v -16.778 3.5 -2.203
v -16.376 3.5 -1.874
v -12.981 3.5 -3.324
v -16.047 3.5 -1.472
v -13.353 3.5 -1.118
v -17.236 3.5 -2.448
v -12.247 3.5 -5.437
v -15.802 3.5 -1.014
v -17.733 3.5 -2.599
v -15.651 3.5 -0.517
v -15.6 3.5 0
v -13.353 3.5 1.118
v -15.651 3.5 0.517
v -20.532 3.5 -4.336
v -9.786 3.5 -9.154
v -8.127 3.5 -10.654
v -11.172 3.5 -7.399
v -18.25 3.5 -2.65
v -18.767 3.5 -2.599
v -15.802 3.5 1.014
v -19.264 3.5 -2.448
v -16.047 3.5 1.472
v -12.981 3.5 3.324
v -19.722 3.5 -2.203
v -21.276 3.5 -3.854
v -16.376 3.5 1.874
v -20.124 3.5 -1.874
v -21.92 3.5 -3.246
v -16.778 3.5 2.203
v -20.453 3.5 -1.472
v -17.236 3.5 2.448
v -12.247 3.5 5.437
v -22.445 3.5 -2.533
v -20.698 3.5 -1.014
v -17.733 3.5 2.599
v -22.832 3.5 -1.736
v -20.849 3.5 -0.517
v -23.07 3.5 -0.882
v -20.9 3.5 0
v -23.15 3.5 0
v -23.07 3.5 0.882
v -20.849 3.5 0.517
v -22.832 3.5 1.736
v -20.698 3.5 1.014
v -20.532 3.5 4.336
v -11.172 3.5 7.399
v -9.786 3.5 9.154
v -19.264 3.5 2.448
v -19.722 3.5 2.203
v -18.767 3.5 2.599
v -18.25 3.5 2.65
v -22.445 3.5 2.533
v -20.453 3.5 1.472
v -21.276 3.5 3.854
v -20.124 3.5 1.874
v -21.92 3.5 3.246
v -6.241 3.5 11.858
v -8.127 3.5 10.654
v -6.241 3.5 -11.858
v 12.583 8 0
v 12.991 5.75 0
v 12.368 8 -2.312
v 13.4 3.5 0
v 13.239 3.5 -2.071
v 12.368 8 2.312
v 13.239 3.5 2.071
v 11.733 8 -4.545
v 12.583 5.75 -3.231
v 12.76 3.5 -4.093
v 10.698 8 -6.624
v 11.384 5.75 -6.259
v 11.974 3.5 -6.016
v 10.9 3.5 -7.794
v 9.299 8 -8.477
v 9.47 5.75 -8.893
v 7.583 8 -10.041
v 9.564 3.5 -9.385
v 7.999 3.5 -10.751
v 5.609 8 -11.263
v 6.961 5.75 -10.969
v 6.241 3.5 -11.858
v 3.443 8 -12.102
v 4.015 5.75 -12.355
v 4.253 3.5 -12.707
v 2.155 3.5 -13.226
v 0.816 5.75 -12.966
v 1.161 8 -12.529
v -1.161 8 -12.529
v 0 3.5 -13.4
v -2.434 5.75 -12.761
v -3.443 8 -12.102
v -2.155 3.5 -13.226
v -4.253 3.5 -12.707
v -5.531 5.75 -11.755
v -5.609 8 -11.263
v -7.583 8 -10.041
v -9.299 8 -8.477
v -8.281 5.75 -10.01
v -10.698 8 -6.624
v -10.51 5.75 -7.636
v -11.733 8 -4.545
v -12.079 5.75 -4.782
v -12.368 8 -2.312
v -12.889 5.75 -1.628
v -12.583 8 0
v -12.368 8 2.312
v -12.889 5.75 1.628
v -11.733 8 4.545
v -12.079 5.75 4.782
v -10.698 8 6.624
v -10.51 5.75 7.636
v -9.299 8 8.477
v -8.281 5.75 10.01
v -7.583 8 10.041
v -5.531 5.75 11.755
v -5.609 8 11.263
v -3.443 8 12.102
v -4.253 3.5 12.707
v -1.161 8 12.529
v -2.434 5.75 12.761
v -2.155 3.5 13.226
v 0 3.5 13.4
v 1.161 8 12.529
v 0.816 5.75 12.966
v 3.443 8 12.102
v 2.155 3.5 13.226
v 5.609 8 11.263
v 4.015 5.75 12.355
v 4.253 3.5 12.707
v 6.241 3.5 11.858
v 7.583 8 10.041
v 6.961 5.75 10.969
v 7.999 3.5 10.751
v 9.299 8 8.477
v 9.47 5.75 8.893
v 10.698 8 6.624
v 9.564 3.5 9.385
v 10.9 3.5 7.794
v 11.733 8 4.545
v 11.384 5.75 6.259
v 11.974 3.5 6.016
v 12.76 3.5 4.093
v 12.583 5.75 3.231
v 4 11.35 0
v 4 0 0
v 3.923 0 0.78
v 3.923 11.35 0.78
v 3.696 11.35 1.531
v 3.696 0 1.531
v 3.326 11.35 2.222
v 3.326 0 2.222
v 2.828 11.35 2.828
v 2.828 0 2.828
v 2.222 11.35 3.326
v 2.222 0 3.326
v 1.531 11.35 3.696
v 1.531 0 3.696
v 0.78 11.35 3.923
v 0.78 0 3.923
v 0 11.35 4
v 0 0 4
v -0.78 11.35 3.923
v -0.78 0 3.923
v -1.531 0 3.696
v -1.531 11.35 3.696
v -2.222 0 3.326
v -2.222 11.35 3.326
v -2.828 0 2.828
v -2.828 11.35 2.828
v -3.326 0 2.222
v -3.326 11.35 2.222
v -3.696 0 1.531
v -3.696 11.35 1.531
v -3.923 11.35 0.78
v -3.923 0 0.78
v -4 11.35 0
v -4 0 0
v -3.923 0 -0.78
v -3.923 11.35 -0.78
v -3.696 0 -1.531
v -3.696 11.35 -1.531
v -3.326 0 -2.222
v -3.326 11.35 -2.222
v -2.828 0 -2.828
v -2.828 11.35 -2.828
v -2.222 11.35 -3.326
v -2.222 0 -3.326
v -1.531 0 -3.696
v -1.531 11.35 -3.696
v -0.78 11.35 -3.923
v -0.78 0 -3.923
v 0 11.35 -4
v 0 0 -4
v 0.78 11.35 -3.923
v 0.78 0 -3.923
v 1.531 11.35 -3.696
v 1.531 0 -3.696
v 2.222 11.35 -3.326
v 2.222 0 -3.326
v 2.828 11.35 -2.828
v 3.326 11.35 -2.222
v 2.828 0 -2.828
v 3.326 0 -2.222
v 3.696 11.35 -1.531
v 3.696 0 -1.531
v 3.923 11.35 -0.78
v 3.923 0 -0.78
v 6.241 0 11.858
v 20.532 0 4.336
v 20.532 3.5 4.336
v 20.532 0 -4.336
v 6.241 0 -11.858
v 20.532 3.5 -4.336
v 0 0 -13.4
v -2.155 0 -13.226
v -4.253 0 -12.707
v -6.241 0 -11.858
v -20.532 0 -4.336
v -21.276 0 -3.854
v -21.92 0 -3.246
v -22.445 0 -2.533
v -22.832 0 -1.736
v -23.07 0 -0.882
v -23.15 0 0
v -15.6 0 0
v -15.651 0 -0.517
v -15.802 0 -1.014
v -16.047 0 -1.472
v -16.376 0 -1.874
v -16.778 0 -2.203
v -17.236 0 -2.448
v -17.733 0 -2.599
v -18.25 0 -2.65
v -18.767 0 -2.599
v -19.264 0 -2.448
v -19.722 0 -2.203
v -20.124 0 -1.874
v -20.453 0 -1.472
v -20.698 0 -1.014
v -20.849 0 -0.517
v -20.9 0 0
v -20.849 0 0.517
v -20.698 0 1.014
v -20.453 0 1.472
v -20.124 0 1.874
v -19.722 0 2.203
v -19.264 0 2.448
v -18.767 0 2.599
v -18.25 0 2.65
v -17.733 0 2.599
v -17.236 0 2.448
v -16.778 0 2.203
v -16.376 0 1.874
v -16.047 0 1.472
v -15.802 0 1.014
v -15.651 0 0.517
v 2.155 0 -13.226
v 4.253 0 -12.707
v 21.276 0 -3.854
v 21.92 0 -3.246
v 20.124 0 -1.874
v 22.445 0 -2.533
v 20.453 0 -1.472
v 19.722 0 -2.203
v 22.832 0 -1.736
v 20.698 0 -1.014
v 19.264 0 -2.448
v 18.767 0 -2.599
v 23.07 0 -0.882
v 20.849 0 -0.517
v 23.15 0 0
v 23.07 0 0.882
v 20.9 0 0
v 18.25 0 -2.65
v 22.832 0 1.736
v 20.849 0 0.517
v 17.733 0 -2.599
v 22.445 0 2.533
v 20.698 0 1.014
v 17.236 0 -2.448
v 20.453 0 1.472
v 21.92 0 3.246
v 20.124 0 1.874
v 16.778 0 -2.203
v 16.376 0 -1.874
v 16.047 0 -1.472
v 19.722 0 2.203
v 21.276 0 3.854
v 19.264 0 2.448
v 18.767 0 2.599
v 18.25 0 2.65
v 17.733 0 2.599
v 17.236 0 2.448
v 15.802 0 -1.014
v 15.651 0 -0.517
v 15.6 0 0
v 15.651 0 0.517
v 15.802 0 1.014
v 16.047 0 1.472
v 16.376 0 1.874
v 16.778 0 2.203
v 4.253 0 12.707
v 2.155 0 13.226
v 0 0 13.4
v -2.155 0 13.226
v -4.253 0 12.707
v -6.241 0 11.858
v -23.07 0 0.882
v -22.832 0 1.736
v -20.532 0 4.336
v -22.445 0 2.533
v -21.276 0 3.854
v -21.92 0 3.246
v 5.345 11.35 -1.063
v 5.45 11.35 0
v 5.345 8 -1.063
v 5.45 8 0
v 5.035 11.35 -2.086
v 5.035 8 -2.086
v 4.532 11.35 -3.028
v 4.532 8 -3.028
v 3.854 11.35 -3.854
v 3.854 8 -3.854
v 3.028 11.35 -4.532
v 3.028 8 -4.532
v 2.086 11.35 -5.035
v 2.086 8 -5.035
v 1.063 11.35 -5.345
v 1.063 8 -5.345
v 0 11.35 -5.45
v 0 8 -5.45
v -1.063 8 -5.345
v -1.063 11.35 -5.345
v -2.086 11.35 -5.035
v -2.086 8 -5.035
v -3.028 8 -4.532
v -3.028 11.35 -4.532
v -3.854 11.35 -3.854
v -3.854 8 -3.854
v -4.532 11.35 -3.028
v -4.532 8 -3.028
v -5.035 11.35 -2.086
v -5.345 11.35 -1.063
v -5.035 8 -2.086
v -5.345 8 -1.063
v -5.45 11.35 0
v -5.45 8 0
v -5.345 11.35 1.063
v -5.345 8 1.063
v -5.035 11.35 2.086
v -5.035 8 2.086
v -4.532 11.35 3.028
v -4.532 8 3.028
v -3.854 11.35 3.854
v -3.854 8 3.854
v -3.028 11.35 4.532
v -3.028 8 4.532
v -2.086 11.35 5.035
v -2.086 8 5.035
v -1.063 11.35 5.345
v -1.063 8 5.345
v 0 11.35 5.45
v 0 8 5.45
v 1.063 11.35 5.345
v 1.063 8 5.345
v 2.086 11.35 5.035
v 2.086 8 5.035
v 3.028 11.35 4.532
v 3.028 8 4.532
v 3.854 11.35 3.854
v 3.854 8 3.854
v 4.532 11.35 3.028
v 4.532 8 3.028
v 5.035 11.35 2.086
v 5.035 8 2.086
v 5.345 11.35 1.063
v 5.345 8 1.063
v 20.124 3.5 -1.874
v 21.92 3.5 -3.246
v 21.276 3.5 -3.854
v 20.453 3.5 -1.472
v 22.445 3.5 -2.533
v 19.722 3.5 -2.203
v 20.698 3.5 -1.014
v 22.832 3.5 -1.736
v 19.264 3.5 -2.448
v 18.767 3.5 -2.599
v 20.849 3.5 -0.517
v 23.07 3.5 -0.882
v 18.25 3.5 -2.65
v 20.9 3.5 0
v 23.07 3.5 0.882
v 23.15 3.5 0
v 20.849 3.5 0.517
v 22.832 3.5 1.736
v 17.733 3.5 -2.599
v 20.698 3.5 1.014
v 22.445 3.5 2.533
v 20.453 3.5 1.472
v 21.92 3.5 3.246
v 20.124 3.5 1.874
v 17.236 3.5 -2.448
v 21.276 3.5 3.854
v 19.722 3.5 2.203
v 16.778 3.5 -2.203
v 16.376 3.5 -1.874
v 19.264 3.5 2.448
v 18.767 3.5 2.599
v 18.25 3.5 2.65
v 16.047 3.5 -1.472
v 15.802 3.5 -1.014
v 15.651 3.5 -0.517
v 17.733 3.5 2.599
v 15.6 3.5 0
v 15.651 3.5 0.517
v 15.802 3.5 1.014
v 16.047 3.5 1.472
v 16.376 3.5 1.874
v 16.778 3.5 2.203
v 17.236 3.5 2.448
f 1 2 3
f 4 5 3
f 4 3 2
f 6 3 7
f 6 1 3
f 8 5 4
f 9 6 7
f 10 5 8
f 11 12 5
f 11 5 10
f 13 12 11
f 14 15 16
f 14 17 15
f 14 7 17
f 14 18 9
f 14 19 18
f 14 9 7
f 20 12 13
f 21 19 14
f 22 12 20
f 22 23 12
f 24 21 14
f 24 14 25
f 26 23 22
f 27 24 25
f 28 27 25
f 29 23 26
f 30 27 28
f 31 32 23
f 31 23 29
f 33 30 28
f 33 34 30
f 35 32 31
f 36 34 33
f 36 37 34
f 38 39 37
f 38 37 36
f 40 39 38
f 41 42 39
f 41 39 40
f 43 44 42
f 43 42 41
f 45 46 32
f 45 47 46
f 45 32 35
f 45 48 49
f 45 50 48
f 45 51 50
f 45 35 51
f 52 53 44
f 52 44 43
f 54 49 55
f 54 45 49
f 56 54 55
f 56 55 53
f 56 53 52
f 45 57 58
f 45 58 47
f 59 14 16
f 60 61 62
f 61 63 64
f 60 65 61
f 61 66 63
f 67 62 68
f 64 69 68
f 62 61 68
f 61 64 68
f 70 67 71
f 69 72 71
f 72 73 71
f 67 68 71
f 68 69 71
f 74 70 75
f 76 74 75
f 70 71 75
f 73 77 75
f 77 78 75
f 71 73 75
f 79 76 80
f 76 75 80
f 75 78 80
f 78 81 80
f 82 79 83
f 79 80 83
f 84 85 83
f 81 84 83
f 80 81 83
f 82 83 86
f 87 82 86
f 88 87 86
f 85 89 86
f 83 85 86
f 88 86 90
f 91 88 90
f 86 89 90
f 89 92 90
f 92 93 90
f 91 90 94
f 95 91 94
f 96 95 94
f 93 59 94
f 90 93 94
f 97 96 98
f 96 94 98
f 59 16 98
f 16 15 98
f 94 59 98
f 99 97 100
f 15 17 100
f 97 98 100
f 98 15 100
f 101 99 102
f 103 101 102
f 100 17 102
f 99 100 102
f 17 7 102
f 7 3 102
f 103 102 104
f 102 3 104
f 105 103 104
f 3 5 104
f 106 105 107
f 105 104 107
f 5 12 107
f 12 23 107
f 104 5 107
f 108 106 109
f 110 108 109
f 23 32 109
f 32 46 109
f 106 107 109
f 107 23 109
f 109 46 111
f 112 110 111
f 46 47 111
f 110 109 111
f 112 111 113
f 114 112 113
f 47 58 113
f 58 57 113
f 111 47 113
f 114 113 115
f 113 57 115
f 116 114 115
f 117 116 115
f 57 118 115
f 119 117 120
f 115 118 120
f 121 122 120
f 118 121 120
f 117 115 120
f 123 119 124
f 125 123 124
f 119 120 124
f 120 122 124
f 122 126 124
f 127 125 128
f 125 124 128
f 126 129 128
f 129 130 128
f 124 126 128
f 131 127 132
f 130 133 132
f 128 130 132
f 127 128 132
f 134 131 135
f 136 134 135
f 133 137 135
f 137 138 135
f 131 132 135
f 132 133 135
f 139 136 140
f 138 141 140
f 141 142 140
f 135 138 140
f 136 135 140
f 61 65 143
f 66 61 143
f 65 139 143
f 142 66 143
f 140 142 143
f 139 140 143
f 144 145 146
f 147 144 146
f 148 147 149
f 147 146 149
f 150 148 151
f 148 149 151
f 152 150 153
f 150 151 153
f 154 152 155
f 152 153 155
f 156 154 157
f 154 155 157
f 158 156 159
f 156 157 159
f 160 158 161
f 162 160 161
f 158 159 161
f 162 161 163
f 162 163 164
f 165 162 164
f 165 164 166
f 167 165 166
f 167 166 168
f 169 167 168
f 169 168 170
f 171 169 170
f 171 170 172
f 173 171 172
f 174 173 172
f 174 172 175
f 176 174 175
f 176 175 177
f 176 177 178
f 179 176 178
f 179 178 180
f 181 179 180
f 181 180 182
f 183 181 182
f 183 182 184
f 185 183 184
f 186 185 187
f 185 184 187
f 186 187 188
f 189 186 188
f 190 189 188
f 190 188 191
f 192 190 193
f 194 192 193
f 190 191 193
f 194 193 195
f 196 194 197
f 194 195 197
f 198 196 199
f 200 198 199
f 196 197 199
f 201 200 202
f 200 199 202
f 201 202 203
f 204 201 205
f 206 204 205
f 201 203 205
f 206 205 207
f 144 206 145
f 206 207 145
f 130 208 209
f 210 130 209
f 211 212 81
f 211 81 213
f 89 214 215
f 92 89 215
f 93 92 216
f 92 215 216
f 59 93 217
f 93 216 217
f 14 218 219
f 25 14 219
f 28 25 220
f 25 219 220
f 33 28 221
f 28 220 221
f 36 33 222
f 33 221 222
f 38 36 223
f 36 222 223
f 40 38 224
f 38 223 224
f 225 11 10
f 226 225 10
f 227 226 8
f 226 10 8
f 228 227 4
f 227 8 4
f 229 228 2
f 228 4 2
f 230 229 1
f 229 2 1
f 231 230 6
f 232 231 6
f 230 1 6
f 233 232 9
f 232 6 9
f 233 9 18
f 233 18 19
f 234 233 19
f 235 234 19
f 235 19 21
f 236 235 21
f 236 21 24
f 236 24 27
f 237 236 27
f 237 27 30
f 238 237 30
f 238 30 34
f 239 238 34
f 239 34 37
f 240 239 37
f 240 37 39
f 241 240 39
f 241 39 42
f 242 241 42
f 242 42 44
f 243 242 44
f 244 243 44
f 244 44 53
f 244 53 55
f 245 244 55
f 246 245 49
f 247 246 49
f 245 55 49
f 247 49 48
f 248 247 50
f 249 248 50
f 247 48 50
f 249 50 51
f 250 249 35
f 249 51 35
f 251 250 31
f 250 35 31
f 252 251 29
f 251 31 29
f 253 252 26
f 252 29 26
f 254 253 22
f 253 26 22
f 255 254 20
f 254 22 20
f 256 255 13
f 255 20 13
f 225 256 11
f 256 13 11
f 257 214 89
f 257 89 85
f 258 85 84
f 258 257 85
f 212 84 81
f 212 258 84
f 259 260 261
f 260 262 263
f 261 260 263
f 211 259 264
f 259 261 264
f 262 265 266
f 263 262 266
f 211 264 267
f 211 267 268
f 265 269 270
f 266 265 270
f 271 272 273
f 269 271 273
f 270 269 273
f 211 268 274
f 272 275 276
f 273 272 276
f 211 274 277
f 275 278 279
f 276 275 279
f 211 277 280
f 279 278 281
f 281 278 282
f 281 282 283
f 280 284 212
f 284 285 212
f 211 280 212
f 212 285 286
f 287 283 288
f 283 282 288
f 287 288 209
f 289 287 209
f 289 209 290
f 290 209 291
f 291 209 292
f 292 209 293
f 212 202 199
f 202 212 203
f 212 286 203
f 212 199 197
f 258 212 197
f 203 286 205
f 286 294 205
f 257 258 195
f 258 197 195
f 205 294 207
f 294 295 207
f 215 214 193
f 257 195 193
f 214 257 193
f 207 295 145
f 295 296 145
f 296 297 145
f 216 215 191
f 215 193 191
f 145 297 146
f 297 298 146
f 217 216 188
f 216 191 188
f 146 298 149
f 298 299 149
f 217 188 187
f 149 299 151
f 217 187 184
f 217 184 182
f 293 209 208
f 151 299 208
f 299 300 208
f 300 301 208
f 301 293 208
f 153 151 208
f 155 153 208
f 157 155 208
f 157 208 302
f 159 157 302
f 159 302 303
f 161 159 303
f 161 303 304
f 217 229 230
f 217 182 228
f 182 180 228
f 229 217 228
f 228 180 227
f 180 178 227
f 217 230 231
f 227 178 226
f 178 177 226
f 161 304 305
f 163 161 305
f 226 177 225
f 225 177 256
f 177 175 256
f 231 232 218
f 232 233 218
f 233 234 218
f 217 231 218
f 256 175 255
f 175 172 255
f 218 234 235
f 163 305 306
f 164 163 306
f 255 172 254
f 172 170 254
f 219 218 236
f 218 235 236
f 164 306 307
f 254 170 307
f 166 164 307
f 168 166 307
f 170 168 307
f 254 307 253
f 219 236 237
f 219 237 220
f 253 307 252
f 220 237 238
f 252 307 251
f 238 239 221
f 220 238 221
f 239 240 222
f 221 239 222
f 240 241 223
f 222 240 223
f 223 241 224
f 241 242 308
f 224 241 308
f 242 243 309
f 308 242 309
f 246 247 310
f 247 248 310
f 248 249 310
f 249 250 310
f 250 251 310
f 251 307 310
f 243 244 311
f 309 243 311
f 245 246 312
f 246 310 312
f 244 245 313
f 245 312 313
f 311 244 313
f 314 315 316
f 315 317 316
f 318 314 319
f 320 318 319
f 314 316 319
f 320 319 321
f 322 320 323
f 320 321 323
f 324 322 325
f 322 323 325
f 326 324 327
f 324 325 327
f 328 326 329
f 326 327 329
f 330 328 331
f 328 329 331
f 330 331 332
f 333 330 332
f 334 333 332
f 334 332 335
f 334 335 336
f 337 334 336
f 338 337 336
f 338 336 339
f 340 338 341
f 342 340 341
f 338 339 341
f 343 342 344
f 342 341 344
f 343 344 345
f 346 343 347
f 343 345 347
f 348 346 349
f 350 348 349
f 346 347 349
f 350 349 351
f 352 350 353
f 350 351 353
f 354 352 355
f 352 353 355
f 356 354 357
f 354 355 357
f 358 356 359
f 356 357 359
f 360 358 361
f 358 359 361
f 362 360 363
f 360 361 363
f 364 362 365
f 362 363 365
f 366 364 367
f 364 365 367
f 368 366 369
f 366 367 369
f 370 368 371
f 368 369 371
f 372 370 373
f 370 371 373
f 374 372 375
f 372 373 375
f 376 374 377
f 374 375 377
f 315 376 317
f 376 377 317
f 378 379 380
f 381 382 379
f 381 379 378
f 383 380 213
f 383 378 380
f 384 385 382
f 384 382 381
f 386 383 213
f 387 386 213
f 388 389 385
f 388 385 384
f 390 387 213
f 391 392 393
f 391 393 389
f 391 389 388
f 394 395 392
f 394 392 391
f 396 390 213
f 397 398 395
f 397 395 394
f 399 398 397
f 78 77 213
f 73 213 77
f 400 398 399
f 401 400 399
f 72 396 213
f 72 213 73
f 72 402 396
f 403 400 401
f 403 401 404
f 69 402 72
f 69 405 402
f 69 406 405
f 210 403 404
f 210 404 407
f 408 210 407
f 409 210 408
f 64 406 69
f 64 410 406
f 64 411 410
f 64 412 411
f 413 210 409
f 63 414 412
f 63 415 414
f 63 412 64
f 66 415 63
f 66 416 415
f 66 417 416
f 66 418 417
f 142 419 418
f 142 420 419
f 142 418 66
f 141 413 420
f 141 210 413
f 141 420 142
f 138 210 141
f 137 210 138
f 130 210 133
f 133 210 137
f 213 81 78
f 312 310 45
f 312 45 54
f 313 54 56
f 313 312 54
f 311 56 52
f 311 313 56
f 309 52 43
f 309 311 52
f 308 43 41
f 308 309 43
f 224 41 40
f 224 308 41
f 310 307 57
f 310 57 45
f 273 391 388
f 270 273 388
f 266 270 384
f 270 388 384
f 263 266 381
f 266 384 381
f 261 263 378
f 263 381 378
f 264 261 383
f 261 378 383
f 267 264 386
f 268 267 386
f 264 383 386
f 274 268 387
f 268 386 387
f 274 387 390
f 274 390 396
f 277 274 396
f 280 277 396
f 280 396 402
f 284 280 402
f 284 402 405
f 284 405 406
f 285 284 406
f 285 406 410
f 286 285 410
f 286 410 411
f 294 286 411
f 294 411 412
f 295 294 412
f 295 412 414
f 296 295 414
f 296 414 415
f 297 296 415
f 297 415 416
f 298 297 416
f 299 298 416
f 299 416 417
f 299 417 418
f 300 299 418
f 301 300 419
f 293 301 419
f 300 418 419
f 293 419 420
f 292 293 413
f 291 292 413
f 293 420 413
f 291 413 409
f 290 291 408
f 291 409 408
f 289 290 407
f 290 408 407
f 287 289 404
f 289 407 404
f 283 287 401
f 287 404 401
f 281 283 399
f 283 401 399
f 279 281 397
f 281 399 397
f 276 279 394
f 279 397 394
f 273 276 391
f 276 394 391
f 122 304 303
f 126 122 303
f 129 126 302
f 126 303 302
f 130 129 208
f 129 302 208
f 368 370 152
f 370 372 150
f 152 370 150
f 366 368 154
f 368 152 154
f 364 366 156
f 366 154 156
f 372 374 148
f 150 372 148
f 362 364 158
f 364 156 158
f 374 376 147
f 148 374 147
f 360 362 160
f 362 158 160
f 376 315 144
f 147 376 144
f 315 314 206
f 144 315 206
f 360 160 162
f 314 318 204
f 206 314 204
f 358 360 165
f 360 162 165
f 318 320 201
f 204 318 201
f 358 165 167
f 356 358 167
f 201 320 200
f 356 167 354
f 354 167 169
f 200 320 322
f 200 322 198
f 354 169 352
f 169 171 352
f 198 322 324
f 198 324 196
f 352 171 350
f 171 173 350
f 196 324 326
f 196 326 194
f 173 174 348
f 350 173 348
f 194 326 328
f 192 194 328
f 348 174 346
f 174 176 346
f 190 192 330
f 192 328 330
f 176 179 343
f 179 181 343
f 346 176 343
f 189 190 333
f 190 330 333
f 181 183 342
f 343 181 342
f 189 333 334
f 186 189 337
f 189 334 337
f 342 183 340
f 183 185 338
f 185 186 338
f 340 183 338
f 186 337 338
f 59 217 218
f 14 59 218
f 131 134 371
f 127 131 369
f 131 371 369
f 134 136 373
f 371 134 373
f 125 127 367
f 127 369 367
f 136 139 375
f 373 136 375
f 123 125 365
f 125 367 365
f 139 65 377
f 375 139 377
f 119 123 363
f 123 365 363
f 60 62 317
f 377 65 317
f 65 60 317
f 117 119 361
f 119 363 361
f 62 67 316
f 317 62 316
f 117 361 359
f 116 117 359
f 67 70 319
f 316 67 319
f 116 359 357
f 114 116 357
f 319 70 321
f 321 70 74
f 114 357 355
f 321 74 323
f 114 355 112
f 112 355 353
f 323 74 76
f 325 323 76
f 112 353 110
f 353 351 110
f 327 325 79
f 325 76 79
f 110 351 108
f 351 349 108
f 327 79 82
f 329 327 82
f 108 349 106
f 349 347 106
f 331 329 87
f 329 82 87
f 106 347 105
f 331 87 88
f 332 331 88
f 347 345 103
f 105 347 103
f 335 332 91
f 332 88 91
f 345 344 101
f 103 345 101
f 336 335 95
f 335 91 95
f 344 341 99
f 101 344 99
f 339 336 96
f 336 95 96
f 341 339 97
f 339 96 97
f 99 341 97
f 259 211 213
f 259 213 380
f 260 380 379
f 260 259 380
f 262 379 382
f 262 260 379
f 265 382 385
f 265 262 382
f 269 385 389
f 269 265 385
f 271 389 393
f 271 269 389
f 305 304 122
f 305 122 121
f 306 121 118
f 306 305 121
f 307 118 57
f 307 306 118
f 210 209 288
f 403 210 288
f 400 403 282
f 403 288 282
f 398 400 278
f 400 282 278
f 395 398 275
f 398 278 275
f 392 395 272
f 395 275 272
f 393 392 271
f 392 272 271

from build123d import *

# Parameters (mm, degrees)
BOSS_EXTRUDE1_DEPTH  = 3.5
SKETCH3_R            = 4
CUT_EXTRUDE1_DEPTH   = 12.35
M5_CLEARANCE_HOLE1_D = 5.3


with BuildPart() as part:
    # Sketch1 → Boss-Extrude1 (new body)
    with BuildSketch(Plane(origin=(0, 0, 0), x_dir=(1, 0, 0), z_dir=(0, 1, 0))):
        with BuildLine():
            Line((-23.15, 0), (0, 0))
            Line((0, 0), (0, 13.4))
            ThreePointArc((0, 13.4), (-3.214400781, 13.008751962), (-6.24109589, 11.857854869))
            Line((-6.24109589, 11.857854869), (-20.532191781, 4.336081258))
            ThreePointArc((-20.532191781, 4.336081258), (-22.44480272, 2.532514588), (-23.15, 0))
        make_face()
    extrude(amount=BOSS_EXTRUDE1_DEPTH)

    # Mirror3: part across plane


with BuildPart() as part_1:
    add(part.part)
    add(part.part.mirror(Plane(origin=(0, 3.5, 0), x_dir=(0, 0, 1), z_dir=(-1, 0, 0))))

    # Mirror4: part across plane


with BuildPart() as part_2:
    add(part_1.part)
    add(part_1.part.mirror(Plane(origin=(-23.15, 3.5, 0), x_dir=(1, 0, 0), z_dir=(0, 0, -1))))

    # Sketch2 → Revolve1 (revolve)
    with BuildSketch(Plane.XY):
        Polygon((0, 0), (0, 11.35), (5.44999985, 11.35), (5.44999985, 7.99999976), (12.582539385, 7.99999976), (13.4, 3.5), (13.4, 0), align=None)
    revolve(axis=Axis((0, 0, 0), (0, 1, 0)))

    # Sketch3 → Cut-Extrude1 (cut, through all)
    with BuildSketch(Plane.XZ):
        Circle(SKETCH3_R)
    extrude(amount=-CUT_EXTRUDE1_DEPTH, mode=Mode.SUBTRACT)

    # M5 Clearance Hole1 (through all)
    with Locations(Plane(origin=(0, 0, 0), x_dir=(-1, 0, 0), z_dir=(0, -1, 0))):
        with Locations((18.25, 0), (-18.25, 0)):
            Hole(M5_CLEARANCE_HOLE1_D / 2)


solid = part_2.part
